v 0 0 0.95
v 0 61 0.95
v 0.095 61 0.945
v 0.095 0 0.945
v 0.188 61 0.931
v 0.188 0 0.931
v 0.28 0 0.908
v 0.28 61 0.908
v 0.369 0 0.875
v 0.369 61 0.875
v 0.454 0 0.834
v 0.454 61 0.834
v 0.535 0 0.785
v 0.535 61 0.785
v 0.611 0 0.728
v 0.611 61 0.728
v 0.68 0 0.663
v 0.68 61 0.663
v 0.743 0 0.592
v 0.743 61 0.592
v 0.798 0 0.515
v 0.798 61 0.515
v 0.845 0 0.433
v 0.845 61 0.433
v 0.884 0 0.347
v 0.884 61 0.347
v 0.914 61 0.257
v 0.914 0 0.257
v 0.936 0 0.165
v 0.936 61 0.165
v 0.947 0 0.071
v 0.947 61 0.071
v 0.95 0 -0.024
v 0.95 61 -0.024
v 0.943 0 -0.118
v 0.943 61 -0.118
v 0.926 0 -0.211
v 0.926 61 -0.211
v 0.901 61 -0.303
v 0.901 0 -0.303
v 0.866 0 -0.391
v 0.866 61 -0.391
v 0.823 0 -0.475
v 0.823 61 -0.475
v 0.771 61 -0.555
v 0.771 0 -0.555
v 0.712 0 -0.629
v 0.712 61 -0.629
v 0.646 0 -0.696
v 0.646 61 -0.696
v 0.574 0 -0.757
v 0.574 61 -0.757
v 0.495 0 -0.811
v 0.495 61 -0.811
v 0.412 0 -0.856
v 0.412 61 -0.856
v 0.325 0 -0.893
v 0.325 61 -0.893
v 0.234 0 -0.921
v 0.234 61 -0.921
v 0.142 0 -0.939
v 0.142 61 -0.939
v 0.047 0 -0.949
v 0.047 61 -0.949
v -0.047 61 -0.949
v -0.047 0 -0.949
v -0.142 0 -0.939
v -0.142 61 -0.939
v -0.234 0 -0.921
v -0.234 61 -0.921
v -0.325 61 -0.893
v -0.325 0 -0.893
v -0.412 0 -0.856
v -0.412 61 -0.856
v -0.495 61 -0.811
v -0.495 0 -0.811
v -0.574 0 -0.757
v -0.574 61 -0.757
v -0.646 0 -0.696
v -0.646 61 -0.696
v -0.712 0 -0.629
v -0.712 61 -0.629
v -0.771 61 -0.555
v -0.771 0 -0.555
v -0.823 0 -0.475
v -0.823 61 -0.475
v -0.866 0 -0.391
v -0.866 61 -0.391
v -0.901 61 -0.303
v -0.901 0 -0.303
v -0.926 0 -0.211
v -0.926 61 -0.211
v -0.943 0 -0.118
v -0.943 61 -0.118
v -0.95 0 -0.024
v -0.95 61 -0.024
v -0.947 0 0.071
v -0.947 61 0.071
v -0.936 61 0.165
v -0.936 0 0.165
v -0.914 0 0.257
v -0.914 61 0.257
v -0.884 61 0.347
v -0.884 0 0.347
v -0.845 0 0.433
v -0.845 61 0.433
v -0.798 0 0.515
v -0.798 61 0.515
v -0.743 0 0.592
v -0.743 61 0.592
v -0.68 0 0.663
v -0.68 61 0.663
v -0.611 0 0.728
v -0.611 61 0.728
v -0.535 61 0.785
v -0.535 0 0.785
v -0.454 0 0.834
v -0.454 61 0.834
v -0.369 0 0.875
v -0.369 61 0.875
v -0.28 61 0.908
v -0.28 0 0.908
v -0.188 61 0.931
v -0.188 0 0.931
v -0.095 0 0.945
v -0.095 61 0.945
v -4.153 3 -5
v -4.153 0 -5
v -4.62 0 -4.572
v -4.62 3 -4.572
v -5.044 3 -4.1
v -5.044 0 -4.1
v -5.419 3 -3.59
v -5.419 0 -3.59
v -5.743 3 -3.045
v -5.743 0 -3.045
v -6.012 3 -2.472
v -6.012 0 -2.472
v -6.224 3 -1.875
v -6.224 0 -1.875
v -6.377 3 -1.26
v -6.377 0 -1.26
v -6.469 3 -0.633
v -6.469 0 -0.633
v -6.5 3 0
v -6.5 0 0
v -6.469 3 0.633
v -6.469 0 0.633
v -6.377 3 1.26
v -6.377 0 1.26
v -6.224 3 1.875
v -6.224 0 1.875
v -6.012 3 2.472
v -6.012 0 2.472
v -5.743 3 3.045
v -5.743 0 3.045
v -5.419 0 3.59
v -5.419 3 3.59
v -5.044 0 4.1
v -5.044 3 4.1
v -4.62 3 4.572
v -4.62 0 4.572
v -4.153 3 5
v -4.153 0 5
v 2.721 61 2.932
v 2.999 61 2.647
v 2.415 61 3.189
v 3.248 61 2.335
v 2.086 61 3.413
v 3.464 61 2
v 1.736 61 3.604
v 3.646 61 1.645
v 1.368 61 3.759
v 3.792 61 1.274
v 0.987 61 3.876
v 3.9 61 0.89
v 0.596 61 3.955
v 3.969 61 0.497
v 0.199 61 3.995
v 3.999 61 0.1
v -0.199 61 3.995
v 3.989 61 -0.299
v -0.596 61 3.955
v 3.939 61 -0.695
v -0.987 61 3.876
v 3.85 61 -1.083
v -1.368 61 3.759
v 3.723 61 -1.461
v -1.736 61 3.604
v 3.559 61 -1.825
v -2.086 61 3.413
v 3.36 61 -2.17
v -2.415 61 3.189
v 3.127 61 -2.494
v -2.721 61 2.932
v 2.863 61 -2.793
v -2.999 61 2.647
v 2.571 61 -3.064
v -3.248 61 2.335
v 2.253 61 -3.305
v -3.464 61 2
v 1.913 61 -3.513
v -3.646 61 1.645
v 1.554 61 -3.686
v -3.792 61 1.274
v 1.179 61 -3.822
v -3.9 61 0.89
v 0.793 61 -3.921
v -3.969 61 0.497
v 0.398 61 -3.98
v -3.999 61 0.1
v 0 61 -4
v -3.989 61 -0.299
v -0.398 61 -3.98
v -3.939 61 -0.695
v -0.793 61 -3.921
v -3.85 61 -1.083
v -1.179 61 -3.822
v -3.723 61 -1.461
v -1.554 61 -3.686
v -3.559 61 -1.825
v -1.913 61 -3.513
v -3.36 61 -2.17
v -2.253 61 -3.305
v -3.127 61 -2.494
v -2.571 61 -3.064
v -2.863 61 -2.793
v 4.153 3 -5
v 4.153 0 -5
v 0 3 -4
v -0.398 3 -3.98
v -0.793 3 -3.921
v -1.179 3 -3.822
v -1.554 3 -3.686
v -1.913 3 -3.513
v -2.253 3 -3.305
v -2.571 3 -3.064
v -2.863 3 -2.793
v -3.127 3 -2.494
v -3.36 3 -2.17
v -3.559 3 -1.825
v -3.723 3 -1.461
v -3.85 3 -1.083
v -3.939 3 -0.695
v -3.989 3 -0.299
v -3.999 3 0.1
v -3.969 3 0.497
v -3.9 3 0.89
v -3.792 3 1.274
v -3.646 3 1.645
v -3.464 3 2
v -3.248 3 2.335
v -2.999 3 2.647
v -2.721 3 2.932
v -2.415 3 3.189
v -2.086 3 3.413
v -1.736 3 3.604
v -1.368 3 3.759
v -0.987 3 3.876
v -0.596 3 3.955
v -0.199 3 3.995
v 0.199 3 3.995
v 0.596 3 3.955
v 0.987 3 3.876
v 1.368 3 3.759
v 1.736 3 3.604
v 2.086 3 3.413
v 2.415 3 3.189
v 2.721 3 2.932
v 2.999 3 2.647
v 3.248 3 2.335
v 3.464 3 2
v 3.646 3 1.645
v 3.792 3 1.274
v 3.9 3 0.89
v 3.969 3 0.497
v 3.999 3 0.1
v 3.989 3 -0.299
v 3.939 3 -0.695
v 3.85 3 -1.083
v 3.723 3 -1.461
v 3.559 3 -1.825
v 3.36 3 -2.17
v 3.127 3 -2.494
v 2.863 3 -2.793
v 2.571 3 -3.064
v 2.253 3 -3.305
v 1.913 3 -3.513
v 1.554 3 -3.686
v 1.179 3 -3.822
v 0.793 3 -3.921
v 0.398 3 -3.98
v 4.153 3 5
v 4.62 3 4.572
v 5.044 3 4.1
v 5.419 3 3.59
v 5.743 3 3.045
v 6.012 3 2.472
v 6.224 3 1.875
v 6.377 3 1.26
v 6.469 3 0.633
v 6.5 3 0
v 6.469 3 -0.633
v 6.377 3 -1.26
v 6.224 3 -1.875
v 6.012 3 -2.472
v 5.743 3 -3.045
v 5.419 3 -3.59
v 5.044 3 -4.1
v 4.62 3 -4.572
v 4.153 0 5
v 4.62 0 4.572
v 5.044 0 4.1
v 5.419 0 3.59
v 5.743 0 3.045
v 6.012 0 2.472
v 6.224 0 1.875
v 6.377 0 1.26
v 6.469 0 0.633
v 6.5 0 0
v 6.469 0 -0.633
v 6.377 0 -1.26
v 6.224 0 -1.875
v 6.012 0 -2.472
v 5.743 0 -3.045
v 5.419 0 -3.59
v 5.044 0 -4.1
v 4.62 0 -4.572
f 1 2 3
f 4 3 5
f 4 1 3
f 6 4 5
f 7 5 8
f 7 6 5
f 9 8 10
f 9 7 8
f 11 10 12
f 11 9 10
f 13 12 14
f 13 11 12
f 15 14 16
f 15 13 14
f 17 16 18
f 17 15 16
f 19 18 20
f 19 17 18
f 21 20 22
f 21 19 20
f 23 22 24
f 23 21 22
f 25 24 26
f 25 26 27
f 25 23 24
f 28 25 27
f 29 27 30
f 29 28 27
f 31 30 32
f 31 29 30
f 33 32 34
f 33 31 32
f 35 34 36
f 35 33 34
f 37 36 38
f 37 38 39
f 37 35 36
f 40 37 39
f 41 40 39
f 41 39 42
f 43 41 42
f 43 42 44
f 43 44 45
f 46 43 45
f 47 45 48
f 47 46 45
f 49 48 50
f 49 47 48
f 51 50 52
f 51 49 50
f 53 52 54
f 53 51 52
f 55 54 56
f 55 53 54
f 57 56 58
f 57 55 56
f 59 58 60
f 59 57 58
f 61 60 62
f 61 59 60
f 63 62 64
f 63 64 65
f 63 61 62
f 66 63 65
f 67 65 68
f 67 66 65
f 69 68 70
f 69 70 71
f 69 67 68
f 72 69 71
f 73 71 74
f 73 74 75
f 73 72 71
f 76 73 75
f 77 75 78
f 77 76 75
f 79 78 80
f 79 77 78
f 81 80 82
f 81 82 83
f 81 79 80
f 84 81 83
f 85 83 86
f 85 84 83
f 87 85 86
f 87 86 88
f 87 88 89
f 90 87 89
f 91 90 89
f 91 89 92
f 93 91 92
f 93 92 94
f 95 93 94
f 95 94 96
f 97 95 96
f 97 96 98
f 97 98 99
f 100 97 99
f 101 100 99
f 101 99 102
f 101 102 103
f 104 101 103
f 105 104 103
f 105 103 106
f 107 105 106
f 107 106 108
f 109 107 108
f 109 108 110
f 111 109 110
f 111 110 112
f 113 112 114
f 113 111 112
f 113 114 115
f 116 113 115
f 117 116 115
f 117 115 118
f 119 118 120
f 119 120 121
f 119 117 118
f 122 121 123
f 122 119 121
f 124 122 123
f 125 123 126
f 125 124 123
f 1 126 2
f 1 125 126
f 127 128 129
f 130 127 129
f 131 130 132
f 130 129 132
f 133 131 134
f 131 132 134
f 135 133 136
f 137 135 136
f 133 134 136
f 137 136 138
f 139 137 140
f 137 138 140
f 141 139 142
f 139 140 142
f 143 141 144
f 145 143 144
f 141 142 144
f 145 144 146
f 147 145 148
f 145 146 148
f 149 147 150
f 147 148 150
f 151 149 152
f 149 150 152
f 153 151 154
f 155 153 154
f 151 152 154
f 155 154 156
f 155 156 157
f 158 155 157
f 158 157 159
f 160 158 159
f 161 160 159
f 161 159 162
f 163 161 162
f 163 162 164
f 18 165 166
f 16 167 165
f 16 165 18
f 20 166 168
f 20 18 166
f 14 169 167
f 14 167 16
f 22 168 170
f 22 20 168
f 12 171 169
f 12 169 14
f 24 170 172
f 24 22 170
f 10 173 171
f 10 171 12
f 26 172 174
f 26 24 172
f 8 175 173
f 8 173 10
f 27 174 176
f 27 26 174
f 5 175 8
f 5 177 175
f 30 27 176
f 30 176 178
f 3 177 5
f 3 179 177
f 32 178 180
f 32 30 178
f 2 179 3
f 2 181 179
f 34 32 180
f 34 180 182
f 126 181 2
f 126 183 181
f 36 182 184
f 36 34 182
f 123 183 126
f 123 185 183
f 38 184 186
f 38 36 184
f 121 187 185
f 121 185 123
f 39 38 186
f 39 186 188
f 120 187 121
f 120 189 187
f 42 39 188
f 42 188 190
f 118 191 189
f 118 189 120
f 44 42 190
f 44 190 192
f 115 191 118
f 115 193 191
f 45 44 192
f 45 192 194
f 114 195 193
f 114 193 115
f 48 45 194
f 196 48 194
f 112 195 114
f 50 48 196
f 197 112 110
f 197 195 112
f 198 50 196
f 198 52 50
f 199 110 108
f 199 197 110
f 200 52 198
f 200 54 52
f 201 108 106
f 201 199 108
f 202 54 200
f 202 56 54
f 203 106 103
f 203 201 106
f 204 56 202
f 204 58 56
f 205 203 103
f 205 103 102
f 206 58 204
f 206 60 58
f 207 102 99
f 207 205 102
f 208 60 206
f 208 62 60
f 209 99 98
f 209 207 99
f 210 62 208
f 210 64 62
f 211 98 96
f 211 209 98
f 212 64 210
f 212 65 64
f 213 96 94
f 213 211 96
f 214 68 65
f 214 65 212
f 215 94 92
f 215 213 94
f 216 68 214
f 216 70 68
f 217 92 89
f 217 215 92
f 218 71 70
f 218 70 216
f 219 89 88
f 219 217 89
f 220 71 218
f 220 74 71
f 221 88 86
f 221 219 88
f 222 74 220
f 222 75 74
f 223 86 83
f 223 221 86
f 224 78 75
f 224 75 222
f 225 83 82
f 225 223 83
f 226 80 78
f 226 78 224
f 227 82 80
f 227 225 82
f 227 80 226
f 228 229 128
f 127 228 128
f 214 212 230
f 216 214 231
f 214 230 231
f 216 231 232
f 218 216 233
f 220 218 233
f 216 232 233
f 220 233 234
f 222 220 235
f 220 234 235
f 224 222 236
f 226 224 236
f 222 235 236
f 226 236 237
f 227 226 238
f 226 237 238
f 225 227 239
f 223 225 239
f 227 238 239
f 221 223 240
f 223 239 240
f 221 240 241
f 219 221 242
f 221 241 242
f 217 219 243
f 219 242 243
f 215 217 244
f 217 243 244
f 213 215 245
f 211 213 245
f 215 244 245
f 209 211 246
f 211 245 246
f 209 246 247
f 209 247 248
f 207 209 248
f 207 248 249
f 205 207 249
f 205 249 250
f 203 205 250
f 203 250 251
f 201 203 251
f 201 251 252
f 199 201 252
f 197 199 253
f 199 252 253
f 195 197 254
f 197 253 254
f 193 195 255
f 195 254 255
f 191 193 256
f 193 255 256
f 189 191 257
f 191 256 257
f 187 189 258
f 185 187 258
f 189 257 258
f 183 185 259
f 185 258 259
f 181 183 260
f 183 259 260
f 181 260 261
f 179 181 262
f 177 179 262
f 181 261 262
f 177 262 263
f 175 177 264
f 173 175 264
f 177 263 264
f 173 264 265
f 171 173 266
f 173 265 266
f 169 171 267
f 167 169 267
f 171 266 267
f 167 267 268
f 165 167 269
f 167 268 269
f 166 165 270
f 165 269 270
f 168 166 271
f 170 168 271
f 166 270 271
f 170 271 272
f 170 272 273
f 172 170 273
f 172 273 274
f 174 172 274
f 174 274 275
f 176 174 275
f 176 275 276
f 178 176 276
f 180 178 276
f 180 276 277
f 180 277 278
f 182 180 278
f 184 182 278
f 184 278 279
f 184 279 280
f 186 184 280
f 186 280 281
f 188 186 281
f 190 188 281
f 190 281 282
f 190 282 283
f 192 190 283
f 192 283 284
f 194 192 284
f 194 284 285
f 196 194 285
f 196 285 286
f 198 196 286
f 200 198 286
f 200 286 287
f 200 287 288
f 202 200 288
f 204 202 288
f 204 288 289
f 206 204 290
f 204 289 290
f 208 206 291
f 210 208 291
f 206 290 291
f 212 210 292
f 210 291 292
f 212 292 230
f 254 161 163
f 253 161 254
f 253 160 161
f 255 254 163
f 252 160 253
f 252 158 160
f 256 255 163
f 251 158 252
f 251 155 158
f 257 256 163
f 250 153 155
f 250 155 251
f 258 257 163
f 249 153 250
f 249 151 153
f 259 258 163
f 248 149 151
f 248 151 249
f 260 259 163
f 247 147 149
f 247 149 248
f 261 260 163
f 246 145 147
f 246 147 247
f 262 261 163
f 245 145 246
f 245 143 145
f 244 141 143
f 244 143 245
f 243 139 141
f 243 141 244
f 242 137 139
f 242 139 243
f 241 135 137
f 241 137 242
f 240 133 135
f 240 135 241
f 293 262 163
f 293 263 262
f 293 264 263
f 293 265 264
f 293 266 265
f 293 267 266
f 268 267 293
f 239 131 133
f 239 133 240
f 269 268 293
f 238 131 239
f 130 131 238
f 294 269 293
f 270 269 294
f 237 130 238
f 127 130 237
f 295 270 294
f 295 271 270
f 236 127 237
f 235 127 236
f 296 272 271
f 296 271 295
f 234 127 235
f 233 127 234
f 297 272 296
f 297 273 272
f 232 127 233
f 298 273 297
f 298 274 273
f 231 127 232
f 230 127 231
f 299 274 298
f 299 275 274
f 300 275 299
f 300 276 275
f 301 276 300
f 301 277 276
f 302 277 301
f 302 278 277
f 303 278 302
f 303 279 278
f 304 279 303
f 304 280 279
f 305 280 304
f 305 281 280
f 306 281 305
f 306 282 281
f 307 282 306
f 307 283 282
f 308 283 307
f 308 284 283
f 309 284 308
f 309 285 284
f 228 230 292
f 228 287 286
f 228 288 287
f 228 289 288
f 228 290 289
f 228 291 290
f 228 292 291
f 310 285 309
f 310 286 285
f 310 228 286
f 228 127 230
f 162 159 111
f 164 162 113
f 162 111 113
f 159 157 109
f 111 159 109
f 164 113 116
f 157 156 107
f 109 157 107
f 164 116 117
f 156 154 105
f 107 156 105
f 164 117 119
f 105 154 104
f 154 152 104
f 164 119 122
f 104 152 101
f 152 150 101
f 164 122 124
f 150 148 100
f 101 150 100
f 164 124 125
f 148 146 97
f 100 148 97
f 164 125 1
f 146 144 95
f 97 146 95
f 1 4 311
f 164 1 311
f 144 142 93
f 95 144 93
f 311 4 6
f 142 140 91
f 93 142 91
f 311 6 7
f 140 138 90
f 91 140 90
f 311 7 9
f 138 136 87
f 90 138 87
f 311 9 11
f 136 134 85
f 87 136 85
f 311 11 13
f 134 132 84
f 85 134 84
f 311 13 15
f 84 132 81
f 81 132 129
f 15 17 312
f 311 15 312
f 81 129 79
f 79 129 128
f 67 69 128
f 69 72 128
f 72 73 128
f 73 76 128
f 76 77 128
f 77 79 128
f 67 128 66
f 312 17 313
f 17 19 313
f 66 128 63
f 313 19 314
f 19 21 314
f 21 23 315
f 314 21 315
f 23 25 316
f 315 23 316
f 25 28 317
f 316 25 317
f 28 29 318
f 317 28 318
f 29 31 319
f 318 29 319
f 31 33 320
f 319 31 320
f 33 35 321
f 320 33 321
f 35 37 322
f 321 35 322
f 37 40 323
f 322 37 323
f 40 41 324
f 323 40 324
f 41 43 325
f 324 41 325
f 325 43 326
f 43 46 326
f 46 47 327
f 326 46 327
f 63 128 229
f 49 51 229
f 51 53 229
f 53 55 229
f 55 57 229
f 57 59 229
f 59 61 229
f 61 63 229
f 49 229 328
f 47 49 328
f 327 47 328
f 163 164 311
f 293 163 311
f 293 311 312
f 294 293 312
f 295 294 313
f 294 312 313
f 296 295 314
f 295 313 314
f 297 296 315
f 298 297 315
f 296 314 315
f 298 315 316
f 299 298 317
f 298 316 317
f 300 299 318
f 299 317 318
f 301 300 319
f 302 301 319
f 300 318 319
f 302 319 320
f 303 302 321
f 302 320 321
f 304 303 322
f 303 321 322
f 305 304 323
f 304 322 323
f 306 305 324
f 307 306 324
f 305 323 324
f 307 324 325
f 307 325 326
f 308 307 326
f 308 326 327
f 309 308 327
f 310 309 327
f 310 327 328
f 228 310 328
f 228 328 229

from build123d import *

# Parameters (mm, degrees)
SKETCH1_R           = 0.95
BOSS_EXTRUDE1_DEPTH = 3
SKETCH2_R           = 4
SKETCH2_R_2         = 0.95
BOSS_EXTRUDE2_DEPTH = 58


with BuildPart() as part:
    # Sketch1 → Boss-Extrude1 (new body)
    with BuildSketch(Plane(origin=(0, 0, 0), x_dir=(1, 0, 0), z_dir=(0, 1, 0))):
        with BuildLine():
            Line((-4.153311931, -5), (4.153311931, -5))
            ThreePointArc((4.153311931, -5), (6.5, 0), (4.153311931, 5))
            Line((4.153311931, 5), (-4.153311931, 5))
            ThreePointArc((-4.153311931, 5), (-6.5, 0), (-4.153311931, -5))
        make_face()
        with Locations(Location((0, 0, 0), (0, 0, 270))):
            Circle(SKETCH1_R, mode=Mode.SUBTRACT)
    extrude(amount=BOSS_EXTRUDE1_DEPTH)

    # Sketch2 → Boss-Extrude2 (add)
    with BuildSketch(Plane(origin=(0, 3, 0), x_dir=(1, 0, 0), z_dir=(0, 1, 0))):
        with Locations(Location((0, 0, 0), (0, 0, 90))):
            Circle(SKETCH2_R)
        with Locations(Location((0, 0, 0), (0, 0, 270))):
            Circle(SKETCH2_R_2, mode=Mode.SUBTRACT)
    extrude(amount=BOSS_EXTRUDE2_DEPTH)


solid = part.part
